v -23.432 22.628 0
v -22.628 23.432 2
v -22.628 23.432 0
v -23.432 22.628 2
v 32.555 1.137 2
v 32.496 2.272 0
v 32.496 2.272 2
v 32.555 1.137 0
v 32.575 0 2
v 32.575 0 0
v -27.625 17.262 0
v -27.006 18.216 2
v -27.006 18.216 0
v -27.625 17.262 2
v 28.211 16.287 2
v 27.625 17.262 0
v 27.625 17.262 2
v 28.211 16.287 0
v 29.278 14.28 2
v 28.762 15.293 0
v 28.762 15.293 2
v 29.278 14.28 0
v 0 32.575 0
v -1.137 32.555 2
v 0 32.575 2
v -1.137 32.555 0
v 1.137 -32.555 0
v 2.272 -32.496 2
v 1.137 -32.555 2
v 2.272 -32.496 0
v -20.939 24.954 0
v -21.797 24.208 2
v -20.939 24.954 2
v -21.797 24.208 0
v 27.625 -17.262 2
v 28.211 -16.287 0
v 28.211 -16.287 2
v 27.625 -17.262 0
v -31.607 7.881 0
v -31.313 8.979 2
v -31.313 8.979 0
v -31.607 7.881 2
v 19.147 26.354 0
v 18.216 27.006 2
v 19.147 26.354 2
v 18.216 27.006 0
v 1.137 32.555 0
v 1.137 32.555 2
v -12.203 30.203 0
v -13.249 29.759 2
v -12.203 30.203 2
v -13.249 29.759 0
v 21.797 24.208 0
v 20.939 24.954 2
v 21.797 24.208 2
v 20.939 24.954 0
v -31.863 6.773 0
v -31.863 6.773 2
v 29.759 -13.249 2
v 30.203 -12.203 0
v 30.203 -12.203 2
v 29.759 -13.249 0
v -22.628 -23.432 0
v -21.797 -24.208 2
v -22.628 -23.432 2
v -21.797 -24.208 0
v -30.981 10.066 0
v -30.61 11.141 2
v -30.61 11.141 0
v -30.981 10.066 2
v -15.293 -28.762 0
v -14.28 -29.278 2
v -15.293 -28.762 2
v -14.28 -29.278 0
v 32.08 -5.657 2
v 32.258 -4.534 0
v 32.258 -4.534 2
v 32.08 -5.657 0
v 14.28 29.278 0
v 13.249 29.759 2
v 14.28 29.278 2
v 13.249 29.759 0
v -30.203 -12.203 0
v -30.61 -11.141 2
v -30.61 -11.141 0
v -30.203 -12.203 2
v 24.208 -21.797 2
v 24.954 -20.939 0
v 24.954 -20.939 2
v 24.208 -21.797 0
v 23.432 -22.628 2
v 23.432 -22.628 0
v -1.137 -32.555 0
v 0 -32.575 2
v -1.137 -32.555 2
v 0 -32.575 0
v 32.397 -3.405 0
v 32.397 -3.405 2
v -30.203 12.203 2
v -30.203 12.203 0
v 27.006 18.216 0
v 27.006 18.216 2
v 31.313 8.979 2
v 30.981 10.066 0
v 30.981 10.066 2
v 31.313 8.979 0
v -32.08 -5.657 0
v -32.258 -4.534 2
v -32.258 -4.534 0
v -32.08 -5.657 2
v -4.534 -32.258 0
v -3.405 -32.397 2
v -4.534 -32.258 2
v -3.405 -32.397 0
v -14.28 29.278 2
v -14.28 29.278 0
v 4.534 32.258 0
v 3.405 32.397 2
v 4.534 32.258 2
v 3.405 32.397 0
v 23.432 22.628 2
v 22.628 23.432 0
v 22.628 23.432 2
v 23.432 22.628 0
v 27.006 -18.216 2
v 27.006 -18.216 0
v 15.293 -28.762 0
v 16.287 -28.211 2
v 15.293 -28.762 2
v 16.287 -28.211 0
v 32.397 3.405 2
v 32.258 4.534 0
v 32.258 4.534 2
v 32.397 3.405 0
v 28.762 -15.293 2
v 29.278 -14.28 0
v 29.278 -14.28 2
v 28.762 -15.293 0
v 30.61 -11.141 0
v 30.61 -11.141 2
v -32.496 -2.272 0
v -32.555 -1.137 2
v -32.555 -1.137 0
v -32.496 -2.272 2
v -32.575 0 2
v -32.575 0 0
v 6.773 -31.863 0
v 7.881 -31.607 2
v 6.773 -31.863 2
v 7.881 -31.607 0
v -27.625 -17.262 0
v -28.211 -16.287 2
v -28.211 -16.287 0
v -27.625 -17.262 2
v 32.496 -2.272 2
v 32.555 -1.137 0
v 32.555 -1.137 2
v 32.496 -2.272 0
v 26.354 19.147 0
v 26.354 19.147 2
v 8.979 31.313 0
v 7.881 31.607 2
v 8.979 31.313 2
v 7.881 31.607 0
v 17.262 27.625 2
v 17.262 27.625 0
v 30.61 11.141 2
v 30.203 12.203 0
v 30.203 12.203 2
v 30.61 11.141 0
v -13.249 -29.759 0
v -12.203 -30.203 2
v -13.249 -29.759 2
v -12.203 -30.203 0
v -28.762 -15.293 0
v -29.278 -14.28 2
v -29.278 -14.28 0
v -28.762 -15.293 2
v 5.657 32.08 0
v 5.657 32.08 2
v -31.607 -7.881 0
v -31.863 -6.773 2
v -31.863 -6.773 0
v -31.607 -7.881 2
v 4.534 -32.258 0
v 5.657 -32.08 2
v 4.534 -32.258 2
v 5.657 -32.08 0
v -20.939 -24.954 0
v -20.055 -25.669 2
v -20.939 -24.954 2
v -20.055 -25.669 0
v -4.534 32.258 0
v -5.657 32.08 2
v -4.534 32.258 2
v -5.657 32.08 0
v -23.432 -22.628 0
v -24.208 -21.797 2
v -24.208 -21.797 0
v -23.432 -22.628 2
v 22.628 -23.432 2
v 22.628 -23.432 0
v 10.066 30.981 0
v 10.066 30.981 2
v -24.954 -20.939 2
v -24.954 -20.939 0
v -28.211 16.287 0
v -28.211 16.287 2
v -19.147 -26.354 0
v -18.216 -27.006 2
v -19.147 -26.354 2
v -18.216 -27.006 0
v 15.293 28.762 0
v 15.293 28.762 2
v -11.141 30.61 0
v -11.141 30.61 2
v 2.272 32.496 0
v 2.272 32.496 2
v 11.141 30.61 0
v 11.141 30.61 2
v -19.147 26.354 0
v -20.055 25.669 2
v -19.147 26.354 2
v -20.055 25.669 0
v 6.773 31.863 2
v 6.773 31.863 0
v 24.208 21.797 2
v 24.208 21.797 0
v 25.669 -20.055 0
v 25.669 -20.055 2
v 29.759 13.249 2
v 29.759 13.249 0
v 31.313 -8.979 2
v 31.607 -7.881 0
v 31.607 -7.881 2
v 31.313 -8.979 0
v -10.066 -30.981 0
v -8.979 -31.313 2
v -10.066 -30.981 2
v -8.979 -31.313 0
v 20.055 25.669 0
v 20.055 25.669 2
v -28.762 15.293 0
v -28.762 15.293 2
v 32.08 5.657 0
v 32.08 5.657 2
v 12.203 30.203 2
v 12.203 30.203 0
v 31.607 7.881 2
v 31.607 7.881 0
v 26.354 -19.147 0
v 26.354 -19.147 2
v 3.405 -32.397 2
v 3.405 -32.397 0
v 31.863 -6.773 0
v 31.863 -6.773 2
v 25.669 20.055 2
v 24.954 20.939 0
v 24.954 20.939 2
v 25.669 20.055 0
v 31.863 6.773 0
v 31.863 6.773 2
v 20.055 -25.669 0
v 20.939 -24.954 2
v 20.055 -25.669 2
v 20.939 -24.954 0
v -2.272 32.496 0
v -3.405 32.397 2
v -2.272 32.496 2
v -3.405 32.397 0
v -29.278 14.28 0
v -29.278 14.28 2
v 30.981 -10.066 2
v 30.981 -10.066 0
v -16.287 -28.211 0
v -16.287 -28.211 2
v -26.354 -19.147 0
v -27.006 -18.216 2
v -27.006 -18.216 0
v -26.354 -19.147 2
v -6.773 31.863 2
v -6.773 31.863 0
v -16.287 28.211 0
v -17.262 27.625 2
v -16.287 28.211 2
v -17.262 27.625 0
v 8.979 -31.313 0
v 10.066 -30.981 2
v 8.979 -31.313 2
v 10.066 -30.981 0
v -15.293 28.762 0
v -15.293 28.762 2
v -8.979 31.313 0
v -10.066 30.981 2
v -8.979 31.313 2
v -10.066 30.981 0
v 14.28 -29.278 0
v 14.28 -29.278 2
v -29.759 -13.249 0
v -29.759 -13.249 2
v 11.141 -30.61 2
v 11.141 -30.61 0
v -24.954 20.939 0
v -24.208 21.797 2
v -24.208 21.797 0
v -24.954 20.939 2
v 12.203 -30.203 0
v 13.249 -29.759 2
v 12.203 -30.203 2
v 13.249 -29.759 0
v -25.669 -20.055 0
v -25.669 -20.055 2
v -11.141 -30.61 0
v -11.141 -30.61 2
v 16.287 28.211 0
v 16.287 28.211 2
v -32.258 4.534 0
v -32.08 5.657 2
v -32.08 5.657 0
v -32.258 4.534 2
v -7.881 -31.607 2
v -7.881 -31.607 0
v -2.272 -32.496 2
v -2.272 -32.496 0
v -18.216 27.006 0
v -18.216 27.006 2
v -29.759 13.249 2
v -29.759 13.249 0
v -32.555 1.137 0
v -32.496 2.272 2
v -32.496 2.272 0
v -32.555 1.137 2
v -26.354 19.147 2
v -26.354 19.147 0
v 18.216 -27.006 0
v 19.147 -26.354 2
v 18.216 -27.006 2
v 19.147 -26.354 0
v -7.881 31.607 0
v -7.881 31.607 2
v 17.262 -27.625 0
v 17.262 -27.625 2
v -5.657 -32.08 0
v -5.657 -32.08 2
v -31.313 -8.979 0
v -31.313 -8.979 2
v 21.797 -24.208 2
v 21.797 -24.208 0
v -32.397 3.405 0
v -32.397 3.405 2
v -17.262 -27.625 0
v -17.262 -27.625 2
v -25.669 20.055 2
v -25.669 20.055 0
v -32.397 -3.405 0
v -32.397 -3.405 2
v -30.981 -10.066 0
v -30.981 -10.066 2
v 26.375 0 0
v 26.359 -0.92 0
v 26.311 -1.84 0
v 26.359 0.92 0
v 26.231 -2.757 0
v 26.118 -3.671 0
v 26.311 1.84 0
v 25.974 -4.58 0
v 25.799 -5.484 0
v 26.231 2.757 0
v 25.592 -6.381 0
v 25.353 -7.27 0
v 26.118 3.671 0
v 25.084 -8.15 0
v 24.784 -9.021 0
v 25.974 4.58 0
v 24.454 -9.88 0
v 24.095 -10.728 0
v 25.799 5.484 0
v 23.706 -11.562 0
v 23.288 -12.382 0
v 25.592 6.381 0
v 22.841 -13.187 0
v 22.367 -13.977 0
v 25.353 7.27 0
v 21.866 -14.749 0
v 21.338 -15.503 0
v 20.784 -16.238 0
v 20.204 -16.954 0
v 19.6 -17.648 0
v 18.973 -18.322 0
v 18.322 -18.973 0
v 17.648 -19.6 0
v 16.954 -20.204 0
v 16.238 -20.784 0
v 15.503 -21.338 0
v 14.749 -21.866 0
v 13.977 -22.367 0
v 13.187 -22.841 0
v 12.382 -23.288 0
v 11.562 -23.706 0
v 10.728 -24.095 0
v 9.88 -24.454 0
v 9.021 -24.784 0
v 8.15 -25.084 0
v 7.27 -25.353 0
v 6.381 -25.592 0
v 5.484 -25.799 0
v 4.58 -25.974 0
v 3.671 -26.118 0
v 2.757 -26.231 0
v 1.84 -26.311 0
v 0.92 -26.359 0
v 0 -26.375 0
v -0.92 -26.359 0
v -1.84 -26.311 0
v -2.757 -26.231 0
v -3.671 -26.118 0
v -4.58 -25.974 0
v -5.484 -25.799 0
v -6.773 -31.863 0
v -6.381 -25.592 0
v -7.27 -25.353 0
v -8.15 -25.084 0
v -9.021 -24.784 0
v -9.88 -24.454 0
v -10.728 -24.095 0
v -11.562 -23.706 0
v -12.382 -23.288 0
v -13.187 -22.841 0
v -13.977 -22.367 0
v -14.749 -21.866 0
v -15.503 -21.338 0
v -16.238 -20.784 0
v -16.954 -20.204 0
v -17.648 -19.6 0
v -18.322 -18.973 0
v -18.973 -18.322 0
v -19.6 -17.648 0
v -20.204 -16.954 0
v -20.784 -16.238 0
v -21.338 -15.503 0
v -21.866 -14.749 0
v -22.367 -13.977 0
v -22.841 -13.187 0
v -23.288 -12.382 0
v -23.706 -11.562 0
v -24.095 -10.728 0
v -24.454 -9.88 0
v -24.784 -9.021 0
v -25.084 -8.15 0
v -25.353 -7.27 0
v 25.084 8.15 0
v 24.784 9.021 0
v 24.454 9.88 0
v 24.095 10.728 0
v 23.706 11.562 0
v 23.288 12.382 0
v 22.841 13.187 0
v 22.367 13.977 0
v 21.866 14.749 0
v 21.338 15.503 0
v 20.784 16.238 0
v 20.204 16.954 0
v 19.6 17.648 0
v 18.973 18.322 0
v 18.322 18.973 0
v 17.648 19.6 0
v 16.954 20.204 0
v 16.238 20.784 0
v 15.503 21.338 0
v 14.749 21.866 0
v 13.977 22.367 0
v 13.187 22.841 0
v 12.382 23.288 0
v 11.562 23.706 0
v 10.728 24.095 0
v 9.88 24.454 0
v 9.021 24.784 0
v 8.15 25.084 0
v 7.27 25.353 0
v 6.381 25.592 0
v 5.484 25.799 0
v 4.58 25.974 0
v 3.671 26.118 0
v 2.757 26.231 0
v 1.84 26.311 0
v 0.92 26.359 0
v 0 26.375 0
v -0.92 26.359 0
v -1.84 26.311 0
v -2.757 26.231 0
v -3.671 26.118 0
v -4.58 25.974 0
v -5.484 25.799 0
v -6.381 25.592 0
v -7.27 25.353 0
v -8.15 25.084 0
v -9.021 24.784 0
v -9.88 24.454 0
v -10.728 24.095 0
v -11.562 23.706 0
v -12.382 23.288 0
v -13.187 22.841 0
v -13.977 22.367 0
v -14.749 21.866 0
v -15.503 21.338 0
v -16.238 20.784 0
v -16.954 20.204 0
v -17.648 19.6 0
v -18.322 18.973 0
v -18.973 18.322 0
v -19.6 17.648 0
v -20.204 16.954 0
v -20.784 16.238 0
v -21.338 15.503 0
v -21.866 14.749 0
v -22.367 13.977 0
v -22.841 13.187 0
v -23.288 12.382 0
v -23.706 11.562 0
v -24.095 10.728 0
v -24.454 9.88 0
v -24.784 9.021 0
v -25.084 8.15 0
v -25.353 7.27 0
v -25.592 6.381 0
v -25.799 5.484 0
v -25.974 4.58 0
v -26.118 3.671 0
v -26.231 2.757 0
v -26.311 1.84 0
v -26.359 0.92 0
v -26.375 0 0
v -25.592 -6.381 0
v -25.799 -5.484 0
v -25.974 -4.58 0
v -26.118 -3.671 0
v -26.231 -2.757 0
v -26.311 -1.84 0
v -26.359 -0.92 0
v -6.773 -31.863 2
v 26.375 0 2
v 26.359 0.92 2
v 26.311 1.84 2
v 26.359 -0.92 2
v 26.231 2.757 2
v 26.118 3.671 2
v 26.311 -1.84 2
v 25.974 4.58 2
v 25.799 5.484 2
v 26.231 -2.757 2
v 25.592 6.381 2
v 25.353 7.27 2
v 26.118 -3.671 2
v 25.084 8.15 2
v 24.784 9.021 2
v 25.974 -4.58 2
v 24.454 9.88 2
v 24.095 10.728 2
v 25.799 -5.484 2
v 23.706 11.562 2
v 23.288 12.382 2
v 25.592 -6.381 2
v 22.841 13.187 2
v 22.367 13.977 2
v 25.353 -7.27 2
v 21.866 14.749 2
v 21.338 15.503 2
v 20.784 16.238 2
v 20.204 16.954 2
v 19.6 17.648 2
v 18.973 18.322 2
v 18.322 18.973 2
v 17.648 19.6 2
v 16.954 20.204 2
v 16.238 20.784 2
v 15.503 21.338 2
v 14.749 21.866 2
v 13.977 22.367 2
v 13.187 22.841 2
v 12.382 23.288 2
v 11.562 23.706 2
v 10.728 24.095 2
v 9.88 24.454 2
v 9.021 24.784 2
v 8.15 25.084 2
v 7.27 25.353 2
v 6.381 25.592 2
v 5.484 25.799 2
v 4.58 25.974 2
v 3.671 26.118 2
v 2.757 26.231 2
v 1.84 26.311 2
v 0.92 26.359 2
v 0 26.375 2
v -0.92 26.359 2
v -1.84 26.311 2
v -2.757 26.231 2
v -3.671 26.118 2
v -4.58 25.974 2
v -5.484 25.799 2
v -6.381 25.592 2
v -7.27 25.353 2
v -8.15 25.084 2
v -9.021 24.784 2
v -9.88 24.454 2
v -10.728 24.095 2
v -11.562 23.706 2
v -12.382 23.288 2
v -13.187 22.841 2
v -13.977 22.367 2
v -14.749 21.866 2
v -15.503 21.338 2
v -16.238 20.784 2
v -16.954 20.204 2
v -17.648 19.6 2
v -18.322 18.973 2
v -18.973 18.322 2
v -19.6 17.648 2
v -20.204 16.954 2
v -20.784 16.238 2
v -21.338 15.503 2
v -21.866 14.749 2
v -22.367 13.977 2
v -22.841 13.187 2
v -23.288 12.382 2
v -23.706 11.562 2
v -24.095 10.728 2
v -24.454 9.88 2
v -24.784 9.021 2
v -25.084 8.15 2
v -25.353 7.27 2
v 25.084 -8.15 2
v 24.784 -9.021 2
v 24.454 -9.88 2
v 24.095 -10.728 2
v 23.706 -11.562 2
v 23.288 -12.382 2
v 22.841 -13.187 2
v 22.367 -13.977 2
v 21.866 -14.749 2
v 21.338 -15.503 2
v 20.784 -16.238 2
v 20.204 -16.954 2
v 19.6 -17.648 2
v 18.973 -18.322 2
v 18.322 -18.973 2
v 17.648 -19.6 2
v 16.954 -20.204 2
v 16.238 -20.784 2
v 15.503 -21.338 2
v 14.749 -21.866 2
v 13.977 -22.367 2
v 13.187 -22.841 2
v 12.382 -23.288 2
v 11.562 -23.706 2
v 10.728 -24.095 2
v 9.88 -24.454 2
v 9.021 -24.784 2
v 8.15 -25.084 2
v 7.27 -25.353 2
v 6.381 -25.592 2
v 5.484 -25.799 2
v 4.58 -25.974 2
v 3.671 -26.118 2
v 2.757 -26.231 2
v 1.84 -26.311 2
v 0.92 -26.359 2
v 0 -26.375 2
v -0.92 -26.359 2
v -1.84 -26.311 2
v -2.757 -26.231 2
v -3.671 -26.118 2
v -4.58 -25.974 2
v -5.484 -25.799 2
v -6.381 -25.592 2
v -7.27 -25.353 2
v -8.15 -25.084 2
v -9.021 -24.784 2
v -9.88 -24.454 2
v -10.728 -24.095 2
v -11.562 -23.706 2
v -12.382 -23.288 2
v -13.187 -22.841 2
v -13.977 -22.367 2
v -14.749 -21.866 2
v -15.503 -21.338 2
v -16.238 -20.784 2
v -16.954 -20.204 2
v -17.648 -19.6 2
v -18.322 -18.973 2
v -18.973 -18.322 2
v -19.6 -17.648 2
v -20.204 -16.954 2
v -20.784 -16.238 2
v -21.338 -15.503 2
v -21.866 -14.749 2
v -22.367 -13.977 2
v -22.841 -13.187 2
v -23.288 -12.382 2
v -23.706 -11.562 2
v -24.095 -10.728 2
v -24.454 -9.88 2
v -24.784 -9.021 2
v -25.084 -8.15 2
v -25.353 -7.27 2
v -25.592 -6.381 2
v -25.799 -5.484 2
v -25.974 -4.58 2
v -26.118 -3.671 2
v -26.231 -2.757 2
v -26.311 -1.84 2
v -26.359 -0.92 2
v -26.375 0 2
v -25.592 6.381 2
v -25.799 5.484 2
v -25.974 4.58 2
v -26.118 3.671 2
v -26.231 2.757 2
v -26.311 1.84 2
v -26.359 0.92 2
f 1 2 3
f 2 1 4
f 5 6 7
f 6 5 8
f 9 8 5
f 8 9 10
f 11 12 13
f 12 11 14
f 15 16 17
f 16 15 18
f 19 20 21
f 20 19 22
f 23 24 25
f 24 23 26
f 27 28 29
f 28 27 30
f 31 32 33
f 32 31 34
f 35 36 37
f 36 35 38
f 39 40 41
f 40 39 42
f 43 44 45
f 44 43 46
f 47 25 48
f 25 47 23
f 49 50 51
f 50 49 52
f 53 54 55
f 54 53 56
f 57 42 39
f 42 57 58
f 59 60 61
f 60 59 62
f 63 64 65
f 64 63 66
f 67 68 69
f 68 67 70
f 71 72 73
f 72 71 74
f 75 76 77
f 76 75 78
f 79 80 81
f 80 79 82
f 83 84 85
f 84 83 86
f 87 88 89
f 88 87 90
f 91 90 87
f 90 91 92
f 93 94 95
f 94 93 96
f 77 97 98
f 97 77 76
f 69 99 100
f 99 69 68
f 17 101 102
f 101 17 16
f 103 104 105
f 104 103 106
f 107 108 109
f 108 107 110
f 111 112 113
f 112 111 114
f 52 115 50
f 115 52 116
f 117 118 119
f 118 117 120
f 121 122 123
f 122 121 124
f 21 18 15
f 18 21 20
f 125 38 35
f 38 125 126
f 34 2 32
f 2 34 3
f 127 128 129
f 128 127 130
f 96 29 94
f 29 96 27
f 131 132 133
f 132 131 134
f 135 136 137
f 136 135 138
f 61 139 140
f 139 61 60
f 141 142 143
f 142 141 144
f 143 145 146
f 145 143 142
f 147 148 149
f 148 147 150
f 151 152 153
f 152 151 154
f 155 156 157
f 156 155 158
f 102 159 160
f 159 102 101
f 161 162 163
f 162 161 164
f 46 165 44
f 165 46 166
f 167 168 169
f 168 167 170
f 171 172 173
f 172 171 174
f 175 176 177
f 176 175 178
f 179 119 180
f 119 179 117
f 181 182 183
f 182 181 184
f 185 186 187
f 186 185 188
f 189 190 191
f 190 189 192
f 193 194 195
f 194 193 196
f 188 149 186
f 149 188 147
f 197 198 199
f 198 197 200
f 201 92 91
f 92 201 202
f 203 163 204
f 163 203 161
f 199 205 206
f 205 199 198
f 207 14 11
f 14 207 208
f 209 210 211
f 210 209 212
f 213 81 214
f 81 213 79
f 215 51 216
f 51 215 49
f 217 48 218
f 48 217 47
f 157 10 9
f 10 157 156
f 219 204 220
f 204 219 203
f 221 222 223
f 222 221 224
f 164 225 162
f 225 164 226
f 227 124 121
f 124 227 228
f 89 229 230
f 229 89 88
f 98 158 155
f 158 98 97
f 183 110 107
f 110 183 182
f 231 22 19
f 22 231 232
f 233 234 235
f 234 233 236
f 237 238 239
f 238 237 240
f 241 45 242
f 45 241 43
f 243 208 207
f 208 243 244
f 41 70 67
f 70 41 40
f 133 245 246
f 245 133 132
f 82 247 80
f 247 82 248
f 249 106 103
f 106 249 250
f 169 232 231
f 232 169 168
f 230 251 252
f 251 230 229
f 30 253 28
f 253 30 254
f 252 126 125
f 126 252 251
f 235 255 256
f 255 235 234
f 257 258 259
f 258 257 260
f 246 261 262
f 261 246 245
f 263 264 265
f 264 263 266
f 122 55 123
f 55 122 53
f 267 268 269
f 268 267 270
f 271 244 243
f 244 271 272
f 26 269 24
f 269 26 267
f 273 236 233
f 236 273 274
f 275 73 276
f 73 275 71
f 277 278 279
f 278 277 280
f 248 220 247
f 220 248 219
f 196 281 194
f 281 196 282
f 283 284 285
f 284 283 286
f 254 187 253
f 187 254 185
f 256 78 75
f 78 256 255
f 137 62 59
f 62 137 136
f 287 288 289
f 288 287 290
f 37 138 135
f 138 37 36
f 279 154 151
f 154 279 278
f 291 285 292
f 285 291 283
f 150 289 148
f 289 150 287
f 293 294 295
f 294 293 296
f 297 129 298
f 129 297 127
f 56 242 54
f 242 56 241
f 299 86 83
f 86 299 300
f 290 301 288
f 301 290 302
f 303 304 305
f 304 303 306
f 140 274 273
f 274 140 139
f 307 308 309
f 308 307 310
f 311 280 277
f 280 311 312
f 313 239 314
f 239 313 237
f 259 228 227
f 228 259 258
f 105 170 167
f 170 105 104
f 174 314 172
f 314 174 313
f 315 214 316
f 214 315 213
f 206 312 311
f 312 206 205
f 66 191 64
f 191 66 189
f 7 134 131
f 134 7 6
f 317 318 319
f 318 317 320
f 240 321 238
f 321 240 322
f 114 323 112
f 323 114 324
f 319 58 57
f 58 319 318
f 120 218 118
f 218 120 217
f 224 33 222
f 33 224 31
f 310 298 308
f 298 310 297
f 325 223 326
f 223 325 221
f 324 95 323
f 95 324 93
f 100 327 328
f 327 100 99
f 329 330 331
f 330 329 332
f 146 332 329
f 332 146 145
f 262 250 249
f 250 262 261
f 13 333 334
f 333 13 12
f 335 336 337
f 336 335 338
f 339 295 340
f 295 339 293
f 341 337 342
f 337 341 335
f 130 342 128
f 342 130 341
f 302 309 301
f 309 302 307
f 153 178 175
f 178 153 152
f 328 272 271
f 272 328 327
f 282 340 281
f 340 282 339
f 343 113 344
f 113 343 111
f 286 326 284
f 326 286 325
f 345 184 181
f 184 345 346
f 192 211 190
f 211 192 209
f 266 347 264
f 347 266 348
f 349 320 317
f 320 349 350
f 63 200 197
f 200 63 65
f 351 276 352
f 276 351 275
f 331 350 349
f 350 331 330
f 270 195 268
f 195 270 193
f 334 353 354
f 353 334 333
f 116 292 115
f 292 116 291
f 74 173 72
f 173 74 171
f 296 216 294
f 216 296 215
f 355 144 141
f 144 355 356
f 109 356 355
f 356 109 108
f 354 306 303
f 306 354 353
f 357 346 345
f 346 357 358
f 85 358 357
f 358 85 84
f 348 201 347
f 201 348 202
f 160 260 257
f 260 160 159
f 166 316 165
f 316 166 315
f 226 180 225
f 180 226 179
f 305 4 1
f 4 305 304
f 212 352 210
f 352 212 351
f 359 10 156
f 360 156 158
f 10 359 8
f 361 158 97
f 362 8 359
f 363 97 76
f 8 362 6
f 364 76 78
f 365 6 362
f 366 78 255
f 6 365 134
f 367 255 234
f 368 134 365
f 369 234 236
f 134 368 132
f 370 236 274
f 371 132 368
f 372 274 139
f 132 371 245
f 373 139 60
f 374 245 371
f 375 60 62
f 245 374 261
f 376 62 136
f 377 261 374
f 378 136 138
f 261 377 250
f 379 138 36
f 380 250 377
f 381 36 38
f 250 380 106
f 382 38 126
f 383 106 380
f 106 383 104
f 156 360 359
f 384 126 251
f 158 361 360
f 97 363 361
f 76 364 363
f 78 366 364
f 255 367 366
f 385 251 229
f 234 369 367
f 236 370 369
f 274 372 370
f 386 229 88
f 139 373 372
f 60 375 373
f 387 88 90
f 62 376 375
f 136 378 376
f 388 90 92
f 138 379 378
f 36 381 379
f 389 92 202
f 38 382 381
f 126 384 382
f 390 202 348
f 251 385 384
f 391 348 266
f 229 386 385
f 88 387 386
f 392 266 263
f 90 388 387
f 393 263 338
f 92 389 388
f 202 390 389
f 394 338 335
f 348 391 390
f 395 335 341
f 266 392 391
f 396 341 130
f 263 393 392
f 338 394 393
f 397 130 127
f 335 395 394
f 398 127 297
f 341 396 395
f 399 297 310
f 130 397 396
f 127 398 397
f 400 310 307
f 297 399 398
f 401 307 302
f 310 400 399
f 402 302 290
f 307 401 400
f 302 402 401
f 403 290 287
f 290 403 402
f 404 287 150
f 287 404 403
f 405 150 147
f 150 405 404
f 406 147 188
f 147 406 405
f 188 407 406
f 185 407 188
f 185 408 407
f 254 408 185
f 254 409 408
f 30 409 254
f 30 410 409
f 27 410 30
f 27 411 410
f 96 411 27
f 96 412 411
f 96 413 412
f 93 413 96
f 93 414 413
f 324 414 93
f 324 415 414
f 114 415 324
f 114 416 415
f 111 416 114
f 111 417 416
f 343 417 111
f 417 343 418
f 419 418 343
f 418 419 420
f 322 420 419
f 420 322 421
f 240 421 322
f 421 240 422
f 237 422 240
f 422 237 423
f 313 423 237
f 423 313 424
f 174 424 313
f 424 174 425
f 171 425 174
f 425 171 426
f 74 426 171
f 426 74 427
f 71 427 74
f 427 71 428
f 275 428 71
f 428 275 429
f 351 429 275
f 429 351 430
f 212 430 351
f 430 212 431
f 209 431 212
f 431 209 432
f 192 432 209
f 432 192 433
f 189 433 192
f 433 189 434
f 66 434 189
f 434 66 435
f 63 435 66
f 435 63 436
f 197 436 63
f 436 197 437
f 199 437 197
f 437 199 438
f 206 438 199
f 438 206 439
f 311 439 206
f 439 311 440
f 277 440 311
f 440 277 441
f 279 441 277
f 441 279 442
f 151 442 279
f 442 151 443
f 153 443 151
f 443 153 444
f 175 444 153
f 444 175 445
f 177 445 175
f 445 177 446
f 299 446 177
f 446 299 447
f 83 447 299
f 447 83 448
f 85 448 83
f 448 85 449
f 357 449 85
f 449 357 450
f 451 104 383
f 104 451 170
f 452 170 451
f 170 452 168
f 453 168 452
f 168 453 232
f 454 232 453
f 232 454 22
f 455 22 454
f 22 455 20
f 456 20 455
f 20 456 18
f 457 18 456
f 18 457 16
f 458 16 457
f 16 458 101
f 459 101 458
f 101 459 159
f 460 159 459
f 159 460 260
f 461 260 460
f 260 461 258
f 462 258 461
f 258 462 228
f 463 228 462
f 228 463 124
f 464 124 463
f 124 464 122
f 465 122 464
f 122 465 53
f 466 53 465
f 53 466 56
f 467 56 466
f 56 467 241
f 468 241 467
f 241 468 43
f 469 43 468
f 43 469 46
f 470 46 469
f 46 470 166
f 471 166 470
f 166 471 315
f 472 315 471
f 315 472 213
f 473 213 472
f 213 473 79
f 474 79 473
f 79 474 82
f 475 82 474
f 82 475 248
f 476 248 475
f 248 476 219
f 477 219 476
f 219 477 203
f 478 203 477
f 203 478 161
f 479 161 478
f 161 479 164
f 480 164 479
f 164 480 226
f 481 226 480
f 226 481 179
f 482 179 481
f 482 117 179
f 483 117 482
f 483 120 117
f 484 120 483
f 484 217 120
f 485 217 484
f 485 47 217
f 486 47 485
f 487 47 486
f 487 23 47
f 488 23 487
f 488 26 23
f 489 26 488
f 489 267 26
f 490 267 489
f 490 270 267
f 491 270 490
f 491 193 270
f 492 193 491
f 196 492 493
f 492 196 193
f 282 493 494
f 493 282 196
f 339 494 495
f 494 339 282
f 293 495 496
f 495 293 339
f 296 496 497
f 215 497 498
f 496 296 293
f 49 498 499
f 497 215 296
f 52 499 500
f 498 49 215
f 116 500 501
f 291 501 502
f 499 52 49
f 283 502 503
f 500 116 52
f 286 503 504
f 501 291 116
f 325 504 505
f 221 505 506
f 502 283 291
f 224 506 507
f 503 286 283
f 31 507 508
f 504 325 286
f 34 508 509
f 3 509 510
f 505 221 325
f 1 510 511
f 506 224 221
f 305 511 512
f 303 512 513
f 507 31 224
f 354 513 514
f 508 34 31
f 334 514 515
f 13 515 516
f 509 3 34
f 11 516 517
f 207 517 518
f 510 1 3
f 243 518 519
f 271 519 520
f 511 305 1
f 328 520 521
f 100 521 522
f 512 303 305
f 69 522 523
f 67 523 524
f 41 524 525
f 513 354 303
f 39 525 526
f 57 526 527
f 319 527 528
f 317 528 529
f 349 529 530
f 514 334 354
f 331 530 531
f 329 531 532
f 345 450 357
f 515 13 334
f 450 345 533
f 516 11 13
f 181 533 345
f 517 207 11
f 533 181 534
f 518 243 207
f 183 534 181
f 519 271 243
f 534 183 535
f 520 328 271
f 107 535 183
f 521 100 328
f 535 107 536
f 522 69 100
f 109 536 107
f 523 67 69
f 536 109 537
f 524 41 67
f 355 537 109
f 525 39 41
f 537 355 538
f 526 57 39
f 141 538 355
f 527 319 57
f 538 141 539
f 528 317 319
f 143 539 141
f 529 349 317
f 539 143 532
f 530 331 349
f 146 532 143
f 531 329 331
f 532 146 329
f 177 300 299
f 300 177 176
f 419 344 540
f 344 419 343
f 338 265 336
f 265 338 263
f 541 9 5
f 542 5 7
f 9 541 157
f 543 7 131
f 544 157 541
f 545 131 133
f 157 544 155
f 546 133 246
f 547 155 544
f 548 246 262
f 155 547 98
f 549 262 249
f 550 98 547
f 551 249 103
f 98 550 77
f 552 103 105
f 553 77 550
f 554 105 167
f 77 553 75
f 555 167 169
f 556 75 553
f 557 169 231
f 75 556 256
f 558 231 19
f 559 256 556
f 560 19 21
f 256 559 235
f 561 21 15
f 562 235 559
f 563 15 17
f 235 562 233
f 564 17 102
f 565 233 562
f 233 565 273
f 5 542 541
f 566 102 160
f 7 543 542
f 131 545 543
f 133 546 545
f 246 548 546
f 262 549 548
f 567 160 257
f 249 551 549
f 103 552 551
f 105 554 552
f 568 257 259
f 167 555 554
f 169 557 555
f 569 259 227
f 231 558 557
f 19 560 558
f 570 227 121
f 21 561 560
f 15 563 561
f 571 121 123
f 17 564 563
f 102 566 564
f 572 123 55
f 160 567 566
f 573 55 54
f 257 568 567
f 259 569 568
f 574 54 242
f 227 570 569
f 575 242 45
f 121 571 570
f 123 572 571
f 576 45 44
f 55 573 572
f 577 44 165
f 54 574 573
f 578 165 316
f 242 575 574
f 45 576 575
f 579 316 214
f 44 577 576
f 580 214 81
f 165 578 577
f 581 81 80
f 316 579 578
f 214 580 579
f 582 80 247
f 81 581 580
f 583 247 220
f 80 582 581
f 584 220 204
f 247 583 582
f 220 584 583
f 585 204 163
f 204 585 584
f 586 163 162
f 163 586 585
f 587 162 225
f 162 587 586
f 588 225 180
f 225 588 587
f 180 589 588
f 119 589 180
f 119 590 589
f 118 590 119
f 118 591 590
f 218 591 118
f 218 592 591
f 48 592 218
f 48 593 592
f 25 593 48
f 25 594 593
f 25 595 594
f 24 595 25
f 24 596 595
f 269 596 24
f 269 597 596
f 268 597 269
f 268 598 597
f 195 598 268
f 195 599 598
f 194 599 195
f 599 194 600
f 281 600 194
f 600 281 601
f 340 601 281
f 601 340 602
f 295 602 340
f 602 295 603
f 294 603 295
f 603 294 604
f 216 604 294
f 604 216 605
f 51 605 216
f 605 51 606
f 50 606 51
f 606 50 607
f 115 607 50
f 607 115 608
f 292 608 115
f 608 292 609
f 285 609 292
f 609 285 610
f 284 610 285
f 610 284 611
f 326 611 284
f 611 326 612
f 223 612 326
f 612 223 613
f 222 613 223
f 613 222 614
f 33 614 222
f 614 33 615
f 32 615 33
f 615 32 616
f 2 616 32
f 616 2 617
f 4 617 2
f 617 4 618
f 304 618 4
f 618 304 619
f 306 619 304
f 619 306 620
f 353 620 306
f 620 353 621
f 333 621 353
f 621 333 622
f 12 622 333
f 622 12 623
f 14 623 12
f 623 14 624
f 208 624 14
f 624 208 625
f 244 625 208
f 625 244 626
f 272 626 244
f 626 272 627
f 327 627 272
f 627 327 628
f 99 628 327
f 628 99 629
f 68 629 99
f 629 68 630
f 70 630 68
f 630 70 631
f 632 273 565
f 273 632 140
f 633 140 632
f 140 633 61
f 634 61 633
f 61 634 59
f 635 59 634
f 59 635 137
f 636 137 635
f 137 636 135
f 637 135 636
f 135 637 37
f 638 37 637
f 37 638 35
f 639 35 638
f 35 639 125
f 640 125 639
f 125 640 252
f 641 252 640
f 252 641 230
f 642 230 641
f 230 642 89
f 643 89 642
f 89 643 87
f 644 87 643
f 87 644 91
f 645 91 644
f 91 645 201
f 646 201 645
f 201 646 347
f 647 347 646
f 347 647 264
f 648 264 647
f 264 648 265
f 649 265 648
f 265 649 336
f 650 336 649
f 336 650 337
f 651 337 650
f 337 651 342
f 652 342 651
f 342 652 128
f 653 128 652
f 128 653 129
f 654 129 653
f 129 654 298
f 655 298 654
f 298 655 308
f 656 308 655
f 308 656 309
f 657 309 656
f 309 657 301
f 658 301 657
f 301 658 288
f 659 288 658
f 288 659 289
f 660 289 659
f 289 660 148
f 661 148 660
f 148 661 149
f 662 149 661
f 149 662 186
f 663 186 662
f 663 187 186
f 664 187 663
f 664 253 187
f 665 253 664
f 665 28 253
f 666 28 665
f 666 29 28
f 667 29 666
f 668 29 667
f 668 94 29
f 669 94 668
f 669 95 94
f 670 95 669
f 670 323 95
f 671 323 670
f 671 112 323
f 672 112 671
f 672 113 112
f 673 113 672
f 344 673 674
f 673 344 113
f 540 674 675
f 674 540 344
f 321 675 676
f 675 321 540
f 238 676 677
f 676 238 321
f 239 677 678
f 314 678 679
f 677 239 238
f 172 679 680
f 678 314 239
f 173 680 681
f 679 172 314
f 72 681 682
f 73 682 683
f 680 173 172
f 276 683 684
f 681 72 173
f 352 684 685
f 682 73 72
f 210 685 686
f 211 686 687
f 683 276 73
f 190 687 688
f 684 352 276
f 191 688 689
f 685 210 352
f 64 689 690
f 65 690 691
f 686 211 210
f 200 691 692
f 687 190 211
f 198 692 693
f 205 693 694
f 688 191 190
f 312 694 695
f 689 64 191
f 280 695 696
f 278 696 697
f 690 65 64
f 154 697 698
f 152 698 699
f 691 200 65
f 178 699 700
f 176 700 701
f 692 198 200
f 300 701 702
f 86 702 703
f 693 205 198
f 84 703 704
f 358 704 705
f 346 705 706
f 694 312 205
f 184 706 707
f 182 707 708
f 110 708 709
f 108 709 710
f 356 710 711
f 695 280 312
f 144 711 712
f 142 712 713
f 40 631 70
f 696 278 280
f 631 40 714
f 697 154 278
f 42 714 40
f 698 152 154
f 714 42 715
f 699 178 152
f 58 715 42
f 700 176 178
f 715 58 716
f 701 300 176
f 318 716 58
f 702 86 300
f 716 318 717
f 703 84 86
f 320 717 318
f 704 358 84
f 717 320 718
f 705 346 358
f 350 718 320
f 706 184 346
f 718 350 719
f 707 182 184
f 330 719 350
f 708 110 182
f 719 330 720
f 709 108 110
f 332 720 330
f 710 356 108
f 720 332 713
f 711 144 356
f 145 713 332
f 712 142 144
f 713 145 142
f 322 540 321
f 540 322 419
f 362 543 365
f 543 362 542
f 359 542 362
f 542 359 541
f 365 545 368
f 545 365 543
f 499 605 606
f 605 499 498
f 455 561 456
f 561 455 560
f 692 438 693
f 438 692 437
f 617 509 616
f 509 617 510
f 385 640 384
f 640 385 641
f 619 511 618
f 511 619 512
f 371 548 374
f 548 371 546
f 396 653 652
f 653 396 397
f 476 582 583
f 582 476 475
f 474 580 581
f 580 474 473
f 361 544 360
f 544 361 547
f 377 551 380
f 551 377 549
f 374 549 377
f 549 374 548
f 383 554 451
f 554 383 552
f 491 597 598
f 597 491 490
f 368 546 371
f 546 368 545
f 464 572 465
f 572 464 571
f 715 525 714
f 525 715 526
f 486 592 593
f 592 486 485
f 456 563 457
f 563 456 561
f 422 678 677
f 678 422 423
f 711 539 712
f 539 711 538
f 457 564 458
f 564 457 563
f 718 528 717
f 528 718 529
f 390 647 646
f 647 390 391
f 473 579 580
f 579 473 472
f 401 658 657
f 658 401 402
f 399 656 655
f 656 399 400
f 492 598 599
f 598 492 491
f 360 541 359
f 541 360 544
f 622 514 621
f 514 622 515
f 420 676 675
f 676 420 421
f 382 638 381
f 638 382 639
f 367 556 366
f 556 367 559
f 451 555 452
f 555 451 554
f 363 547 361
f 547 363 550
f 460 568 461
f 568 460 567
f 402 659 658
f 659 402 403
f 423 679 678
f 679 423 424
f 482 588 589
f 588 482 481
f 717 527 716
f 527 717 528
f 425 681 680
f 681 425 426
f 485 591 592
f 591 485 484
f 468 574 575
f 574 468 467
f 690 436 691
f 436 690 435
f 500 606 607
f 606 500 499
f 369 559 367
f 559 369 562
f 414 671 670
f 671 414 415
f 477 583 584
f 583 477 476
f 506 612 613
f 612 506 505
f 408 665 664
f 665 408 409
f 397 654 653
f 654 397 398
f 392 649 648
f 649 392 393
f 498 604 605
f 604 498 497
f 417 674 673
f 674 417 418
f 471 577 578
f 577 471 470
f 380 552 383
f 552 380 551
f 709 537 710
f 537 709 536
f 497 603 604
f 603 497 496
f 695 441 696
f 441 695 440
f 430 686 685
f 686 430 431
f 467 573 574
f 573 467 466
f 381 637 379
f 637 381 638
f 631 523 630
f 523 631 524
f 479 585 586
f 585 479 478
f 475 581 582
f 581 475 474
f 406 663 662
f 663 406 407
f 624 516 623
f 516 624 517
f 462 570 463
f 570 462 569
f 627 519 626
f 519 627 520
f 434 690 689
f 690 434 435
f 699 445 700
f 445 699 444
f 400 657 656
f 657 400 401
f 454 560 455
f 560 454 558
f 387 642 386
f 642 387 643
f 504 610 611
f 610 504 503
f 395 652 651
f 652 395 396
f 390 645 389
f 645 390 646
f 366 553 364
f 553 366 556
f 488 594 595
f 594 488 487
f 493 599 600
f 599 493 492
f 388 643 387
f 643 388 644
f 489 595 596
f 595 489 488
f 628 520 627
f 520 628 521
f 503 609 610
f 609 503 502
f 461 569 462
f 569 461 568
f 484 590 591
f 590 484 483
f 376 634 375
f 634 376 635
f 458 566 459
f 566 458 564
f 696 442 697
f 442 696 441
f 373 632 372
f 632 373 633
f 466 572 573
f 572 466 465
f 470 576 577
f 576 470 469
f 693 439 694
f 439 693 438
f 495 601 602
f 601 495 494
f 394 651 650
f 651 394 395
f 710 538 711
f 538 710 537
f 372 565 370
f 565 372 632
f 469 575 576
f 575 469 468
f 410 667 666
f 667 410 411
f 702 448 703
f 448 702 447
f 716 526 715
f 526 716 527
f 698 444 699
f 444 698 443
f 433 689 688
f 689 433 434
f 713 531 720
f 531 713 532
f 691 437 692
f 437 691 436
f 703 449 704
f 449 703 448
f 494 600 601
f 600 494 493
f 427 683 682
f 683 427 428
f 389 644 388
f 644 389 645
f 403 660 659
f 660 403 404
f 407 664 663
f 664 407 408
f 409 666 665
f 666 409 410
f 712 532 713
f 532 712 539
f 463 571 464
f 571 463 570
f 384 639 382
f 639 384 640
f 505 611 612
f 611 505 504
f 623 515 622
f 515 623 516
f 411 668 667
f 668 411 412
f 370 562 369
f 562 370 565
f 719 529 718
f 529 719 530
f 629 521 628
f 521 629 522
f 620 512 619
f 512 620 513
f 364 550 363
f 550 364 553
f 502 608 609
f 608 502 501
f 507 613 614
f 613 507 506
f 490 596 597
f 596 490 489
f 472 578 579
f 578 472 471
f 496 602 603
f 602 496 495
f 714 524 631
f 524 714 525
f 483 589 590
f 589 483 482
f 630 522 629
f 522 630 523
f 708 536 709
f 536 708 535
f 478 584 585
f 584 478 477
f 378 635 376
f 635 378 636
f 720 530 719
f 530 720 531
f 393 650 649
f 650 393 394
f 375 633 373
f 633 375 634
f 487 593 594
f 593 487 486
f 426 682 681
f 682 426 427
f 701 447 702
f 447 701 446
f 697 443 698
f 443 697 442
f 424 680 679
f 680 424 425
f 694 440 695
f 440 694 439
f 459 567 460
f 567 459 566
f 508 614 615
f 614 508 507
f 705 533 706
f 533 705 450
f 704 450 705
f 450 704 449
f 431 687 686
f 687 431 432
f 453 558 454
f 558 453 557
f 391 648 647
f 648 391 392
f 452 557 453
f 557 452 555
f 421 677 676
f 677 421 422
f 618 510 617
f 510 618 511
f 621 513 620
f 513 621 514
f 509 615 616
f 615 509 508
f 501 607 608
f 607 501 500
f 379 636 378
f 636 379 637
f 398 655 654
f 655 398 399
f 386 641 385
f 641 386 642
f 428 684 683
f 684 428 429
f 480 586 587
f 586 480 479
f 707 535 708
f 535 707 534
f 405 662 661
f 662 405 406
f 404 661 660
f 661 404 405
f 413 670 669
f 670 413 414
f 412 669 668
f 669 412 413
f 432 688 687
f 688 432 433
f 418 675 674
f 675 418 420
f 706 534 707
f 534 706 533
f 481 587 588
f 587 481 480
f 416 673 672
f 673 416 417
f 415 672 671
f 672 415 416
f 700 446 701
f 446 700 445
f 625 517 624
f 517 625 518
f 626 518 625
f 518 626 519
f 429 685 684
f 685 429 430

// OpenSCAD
// file: ../params.scad
// Piper-Watch - all dimensions in one place (millimetres).
// Values marked EST are estimates; correct them after measuring the real part.

$fn = 96;                        // circle smoothness for previews/exports

// --- Printing: Bambu Lab A1, 0.4 mm nozzle, PETG -------------------------------
line_w      = 0.45;              // extrusion width
wall        = 4 * line_w;        // 1.8 mm: minimum for load-bearing walls
bed         = [225, 225, 225];   // build volume
clr_hole    = 0.30;              // added to bolt hole diameters - measured: +0.3 is the smallest free fit (coupon, 2026-10-01)
clr_fit     = 0.35;              // gap for parts that slide/rotate against each other (a little looser than clr_hole)

// --- Fasteners ------------------------------------------------------------------
m3          = 3.0;
m4          = 4.0;
insert_m3   = [4.1, 5.0];        // heat-set insert bore [diameter, depth] - coupon "M3a" confirmed
insert_m4   = [5.6, 6.0];        // coupon "M4a" confirmed
m5          = 5.0;
insert_m5   = [6.4, 7.0];        // EST - confirm with parts/m5_coupon.scad

// --- Lazy Susan: 140 mm round aluminium turntable bearing (Amazon B08CSMCRC6) ----
// Two COPLANAR rings, both 10.5 mm thick and flush top and bottom, with a 0.8 mm gap.
// The outer ring screws down into the box (countersinks on top); the inner ring
// screws up into the turntable top plate (countersinks underneath). No access hole.
ls_od        = 140;              // outer ring, outside (measured)
ls_ring_w    = 12.4;             // radial width of each ring (measured)
ls_gap       = 0.8;              // radial gap between the rings (measured)
ls_outer_id  = ls_od - 2 * ls_ring_w;            // 115.2  outer ring, inside
ls_inner_od  = ls_outer_id - 2 * ls_gap;         // 113.6  inner ring, outside
ls_id        = ls_inner_od - 2 * ls_ring_w;      // 88.8   centre opening (measured ~89)
ls_h         = 10.5;             // thickness of both rings (measured)
ls_hole_d    = 5.05;             // through holes, countersunk (measured 5.05; M5 passes) -> M5 flat-head screws
ls_outer_bc  = 128.0;            // measured: 133 edge-to-edge across opposite holes - hole dia (ring-centre estimate 127.6)
ls_inner_bc  = 101.0;            // measured: 106 edge-to-edge across opposite holes - hole dia (ring-centre estimate 101.2)
ls_holes     = 4;                // per ring, 90 degrees apart
ls_inner_rot = 45;               // inner holes sit between the outer ones

// Mounting rules that follow from the flush rings
ls_clear     = 1.0;              // keep printed parts this far (diameter) from the other ring
top_plate_d  = ls_inner_od - ls_clear;           // 112.6  turntable plate touches the inner ring only
plinth_id    = ls_outer_id + ls_clear;           // 116.2  box-top plinth touches the outer ring only
plinth_h     = 2.0;              // raised plinth height = clear gap under the inner ring

// --- Feetech STS3215 (12 V / 30 kg.cm) - EST from datasheet, verify on arrival --
sts_body     = [45.2, 24.7, 35]; // length x width x height (without horn)
sts_shaft_x  = 11.5;             // EST: output shaft centre from the near end
sts_horn_d   = 20;               // EST: horn diameter
sts_horn_h   = 3;

// --- Pan-only head on a neck (no tilt motor) ----------------------------------------
head_size    = [105, 45, 105];   // round face: diameter, depth (final ~45), diameter
head_tilt    = 15;               // fixed upward tilt, set by the swappable wedge
neck_out     = 40;               // EST: chamfered square neck, outside
neck_in      = 28;               // inside opening: camera USB plug + ~10 x 2 mm silicone wires

// --- Face LED ring: 24-LED WS2812-type ring (measured / vendor) ------------------------
// Through-hole pads (2x 5 V, 2x GND, DIN, DOUT); wires can leave from either side.
ring_od      = 65.6;             // outer diameter
ring_id      = 52.3;             // inner diameter
ring_t       = 3.2;              // PCB (1.6) + 5050 LEDs
ring_n       = 24;               // LEDs, 15 deg apart (~7.7 mm)

// Diffuser in front of the LEDs (ring_diffuser.scad), pressed into the face flush
diff_t       = 2.0;              // thickness
diff_w       = 6.5;              // radial width
diff_clr     = 0.15;             // press fit, each side

// --- Logitech C920X, housing partly stripped (photos: cam_front.jpg, cam_top.jpg) ---
// Seen from above it is a lozenge: flat glossy front face, rounded back, rounded ends
// (the mic grilles) with a small notch where each grille meets the face.
cam_w        = 94;               // width, along the tilt axis (measured)
cam_h        = 29;               // height (measured)
cam_d        = 24.1;             // depth front-to-back at the middle (measured)
cam_face_l   = 63.5;             // flat front face length between the notches (measured)
cam_cable_x  = 31.6;             // cable centre from the nearest end: measured 30, moved 1.6 mm inward over two fit tests
cam_cable_d  = 3.0;              // cable diameter (measured); USB-A plug on the end, so it can't thread through holes
cam_core     = [cam_w, cam_d, cam_h];

// --- E32R40T 4" display board - TODO: measure outline, holes, connector positions --
lcd_board    = [110, 70, 12];    // EST placeholder
// main file
// Diffuser for the face's LED ring: a flat ring pressed into the face from the front, flush
// with the surface. Print flat on the bed (no supports) in white or natural (translucent)
// PLA/PETG. Thinner = brighter, thicker = smoother: with the 3.5 mm air gap behind it, 2 mm of
// natural PETG or 1.5-2 mm of white PLA blends the 24 LEDs into one glow.
include <../params.scad>

ring_r = (ring_od + ring_id) / 4;              // radius of the LED centres

difference() {
    cylinder(r = ring_r + diff_w / 2 - diff_clr, h = diff_t, $fn = 180);
    translate([0, 0, -1]) cylinder(r = ring_r - diff_w / 2 + diff_clr, h = diff_t + 2, $fn = 180);
}
